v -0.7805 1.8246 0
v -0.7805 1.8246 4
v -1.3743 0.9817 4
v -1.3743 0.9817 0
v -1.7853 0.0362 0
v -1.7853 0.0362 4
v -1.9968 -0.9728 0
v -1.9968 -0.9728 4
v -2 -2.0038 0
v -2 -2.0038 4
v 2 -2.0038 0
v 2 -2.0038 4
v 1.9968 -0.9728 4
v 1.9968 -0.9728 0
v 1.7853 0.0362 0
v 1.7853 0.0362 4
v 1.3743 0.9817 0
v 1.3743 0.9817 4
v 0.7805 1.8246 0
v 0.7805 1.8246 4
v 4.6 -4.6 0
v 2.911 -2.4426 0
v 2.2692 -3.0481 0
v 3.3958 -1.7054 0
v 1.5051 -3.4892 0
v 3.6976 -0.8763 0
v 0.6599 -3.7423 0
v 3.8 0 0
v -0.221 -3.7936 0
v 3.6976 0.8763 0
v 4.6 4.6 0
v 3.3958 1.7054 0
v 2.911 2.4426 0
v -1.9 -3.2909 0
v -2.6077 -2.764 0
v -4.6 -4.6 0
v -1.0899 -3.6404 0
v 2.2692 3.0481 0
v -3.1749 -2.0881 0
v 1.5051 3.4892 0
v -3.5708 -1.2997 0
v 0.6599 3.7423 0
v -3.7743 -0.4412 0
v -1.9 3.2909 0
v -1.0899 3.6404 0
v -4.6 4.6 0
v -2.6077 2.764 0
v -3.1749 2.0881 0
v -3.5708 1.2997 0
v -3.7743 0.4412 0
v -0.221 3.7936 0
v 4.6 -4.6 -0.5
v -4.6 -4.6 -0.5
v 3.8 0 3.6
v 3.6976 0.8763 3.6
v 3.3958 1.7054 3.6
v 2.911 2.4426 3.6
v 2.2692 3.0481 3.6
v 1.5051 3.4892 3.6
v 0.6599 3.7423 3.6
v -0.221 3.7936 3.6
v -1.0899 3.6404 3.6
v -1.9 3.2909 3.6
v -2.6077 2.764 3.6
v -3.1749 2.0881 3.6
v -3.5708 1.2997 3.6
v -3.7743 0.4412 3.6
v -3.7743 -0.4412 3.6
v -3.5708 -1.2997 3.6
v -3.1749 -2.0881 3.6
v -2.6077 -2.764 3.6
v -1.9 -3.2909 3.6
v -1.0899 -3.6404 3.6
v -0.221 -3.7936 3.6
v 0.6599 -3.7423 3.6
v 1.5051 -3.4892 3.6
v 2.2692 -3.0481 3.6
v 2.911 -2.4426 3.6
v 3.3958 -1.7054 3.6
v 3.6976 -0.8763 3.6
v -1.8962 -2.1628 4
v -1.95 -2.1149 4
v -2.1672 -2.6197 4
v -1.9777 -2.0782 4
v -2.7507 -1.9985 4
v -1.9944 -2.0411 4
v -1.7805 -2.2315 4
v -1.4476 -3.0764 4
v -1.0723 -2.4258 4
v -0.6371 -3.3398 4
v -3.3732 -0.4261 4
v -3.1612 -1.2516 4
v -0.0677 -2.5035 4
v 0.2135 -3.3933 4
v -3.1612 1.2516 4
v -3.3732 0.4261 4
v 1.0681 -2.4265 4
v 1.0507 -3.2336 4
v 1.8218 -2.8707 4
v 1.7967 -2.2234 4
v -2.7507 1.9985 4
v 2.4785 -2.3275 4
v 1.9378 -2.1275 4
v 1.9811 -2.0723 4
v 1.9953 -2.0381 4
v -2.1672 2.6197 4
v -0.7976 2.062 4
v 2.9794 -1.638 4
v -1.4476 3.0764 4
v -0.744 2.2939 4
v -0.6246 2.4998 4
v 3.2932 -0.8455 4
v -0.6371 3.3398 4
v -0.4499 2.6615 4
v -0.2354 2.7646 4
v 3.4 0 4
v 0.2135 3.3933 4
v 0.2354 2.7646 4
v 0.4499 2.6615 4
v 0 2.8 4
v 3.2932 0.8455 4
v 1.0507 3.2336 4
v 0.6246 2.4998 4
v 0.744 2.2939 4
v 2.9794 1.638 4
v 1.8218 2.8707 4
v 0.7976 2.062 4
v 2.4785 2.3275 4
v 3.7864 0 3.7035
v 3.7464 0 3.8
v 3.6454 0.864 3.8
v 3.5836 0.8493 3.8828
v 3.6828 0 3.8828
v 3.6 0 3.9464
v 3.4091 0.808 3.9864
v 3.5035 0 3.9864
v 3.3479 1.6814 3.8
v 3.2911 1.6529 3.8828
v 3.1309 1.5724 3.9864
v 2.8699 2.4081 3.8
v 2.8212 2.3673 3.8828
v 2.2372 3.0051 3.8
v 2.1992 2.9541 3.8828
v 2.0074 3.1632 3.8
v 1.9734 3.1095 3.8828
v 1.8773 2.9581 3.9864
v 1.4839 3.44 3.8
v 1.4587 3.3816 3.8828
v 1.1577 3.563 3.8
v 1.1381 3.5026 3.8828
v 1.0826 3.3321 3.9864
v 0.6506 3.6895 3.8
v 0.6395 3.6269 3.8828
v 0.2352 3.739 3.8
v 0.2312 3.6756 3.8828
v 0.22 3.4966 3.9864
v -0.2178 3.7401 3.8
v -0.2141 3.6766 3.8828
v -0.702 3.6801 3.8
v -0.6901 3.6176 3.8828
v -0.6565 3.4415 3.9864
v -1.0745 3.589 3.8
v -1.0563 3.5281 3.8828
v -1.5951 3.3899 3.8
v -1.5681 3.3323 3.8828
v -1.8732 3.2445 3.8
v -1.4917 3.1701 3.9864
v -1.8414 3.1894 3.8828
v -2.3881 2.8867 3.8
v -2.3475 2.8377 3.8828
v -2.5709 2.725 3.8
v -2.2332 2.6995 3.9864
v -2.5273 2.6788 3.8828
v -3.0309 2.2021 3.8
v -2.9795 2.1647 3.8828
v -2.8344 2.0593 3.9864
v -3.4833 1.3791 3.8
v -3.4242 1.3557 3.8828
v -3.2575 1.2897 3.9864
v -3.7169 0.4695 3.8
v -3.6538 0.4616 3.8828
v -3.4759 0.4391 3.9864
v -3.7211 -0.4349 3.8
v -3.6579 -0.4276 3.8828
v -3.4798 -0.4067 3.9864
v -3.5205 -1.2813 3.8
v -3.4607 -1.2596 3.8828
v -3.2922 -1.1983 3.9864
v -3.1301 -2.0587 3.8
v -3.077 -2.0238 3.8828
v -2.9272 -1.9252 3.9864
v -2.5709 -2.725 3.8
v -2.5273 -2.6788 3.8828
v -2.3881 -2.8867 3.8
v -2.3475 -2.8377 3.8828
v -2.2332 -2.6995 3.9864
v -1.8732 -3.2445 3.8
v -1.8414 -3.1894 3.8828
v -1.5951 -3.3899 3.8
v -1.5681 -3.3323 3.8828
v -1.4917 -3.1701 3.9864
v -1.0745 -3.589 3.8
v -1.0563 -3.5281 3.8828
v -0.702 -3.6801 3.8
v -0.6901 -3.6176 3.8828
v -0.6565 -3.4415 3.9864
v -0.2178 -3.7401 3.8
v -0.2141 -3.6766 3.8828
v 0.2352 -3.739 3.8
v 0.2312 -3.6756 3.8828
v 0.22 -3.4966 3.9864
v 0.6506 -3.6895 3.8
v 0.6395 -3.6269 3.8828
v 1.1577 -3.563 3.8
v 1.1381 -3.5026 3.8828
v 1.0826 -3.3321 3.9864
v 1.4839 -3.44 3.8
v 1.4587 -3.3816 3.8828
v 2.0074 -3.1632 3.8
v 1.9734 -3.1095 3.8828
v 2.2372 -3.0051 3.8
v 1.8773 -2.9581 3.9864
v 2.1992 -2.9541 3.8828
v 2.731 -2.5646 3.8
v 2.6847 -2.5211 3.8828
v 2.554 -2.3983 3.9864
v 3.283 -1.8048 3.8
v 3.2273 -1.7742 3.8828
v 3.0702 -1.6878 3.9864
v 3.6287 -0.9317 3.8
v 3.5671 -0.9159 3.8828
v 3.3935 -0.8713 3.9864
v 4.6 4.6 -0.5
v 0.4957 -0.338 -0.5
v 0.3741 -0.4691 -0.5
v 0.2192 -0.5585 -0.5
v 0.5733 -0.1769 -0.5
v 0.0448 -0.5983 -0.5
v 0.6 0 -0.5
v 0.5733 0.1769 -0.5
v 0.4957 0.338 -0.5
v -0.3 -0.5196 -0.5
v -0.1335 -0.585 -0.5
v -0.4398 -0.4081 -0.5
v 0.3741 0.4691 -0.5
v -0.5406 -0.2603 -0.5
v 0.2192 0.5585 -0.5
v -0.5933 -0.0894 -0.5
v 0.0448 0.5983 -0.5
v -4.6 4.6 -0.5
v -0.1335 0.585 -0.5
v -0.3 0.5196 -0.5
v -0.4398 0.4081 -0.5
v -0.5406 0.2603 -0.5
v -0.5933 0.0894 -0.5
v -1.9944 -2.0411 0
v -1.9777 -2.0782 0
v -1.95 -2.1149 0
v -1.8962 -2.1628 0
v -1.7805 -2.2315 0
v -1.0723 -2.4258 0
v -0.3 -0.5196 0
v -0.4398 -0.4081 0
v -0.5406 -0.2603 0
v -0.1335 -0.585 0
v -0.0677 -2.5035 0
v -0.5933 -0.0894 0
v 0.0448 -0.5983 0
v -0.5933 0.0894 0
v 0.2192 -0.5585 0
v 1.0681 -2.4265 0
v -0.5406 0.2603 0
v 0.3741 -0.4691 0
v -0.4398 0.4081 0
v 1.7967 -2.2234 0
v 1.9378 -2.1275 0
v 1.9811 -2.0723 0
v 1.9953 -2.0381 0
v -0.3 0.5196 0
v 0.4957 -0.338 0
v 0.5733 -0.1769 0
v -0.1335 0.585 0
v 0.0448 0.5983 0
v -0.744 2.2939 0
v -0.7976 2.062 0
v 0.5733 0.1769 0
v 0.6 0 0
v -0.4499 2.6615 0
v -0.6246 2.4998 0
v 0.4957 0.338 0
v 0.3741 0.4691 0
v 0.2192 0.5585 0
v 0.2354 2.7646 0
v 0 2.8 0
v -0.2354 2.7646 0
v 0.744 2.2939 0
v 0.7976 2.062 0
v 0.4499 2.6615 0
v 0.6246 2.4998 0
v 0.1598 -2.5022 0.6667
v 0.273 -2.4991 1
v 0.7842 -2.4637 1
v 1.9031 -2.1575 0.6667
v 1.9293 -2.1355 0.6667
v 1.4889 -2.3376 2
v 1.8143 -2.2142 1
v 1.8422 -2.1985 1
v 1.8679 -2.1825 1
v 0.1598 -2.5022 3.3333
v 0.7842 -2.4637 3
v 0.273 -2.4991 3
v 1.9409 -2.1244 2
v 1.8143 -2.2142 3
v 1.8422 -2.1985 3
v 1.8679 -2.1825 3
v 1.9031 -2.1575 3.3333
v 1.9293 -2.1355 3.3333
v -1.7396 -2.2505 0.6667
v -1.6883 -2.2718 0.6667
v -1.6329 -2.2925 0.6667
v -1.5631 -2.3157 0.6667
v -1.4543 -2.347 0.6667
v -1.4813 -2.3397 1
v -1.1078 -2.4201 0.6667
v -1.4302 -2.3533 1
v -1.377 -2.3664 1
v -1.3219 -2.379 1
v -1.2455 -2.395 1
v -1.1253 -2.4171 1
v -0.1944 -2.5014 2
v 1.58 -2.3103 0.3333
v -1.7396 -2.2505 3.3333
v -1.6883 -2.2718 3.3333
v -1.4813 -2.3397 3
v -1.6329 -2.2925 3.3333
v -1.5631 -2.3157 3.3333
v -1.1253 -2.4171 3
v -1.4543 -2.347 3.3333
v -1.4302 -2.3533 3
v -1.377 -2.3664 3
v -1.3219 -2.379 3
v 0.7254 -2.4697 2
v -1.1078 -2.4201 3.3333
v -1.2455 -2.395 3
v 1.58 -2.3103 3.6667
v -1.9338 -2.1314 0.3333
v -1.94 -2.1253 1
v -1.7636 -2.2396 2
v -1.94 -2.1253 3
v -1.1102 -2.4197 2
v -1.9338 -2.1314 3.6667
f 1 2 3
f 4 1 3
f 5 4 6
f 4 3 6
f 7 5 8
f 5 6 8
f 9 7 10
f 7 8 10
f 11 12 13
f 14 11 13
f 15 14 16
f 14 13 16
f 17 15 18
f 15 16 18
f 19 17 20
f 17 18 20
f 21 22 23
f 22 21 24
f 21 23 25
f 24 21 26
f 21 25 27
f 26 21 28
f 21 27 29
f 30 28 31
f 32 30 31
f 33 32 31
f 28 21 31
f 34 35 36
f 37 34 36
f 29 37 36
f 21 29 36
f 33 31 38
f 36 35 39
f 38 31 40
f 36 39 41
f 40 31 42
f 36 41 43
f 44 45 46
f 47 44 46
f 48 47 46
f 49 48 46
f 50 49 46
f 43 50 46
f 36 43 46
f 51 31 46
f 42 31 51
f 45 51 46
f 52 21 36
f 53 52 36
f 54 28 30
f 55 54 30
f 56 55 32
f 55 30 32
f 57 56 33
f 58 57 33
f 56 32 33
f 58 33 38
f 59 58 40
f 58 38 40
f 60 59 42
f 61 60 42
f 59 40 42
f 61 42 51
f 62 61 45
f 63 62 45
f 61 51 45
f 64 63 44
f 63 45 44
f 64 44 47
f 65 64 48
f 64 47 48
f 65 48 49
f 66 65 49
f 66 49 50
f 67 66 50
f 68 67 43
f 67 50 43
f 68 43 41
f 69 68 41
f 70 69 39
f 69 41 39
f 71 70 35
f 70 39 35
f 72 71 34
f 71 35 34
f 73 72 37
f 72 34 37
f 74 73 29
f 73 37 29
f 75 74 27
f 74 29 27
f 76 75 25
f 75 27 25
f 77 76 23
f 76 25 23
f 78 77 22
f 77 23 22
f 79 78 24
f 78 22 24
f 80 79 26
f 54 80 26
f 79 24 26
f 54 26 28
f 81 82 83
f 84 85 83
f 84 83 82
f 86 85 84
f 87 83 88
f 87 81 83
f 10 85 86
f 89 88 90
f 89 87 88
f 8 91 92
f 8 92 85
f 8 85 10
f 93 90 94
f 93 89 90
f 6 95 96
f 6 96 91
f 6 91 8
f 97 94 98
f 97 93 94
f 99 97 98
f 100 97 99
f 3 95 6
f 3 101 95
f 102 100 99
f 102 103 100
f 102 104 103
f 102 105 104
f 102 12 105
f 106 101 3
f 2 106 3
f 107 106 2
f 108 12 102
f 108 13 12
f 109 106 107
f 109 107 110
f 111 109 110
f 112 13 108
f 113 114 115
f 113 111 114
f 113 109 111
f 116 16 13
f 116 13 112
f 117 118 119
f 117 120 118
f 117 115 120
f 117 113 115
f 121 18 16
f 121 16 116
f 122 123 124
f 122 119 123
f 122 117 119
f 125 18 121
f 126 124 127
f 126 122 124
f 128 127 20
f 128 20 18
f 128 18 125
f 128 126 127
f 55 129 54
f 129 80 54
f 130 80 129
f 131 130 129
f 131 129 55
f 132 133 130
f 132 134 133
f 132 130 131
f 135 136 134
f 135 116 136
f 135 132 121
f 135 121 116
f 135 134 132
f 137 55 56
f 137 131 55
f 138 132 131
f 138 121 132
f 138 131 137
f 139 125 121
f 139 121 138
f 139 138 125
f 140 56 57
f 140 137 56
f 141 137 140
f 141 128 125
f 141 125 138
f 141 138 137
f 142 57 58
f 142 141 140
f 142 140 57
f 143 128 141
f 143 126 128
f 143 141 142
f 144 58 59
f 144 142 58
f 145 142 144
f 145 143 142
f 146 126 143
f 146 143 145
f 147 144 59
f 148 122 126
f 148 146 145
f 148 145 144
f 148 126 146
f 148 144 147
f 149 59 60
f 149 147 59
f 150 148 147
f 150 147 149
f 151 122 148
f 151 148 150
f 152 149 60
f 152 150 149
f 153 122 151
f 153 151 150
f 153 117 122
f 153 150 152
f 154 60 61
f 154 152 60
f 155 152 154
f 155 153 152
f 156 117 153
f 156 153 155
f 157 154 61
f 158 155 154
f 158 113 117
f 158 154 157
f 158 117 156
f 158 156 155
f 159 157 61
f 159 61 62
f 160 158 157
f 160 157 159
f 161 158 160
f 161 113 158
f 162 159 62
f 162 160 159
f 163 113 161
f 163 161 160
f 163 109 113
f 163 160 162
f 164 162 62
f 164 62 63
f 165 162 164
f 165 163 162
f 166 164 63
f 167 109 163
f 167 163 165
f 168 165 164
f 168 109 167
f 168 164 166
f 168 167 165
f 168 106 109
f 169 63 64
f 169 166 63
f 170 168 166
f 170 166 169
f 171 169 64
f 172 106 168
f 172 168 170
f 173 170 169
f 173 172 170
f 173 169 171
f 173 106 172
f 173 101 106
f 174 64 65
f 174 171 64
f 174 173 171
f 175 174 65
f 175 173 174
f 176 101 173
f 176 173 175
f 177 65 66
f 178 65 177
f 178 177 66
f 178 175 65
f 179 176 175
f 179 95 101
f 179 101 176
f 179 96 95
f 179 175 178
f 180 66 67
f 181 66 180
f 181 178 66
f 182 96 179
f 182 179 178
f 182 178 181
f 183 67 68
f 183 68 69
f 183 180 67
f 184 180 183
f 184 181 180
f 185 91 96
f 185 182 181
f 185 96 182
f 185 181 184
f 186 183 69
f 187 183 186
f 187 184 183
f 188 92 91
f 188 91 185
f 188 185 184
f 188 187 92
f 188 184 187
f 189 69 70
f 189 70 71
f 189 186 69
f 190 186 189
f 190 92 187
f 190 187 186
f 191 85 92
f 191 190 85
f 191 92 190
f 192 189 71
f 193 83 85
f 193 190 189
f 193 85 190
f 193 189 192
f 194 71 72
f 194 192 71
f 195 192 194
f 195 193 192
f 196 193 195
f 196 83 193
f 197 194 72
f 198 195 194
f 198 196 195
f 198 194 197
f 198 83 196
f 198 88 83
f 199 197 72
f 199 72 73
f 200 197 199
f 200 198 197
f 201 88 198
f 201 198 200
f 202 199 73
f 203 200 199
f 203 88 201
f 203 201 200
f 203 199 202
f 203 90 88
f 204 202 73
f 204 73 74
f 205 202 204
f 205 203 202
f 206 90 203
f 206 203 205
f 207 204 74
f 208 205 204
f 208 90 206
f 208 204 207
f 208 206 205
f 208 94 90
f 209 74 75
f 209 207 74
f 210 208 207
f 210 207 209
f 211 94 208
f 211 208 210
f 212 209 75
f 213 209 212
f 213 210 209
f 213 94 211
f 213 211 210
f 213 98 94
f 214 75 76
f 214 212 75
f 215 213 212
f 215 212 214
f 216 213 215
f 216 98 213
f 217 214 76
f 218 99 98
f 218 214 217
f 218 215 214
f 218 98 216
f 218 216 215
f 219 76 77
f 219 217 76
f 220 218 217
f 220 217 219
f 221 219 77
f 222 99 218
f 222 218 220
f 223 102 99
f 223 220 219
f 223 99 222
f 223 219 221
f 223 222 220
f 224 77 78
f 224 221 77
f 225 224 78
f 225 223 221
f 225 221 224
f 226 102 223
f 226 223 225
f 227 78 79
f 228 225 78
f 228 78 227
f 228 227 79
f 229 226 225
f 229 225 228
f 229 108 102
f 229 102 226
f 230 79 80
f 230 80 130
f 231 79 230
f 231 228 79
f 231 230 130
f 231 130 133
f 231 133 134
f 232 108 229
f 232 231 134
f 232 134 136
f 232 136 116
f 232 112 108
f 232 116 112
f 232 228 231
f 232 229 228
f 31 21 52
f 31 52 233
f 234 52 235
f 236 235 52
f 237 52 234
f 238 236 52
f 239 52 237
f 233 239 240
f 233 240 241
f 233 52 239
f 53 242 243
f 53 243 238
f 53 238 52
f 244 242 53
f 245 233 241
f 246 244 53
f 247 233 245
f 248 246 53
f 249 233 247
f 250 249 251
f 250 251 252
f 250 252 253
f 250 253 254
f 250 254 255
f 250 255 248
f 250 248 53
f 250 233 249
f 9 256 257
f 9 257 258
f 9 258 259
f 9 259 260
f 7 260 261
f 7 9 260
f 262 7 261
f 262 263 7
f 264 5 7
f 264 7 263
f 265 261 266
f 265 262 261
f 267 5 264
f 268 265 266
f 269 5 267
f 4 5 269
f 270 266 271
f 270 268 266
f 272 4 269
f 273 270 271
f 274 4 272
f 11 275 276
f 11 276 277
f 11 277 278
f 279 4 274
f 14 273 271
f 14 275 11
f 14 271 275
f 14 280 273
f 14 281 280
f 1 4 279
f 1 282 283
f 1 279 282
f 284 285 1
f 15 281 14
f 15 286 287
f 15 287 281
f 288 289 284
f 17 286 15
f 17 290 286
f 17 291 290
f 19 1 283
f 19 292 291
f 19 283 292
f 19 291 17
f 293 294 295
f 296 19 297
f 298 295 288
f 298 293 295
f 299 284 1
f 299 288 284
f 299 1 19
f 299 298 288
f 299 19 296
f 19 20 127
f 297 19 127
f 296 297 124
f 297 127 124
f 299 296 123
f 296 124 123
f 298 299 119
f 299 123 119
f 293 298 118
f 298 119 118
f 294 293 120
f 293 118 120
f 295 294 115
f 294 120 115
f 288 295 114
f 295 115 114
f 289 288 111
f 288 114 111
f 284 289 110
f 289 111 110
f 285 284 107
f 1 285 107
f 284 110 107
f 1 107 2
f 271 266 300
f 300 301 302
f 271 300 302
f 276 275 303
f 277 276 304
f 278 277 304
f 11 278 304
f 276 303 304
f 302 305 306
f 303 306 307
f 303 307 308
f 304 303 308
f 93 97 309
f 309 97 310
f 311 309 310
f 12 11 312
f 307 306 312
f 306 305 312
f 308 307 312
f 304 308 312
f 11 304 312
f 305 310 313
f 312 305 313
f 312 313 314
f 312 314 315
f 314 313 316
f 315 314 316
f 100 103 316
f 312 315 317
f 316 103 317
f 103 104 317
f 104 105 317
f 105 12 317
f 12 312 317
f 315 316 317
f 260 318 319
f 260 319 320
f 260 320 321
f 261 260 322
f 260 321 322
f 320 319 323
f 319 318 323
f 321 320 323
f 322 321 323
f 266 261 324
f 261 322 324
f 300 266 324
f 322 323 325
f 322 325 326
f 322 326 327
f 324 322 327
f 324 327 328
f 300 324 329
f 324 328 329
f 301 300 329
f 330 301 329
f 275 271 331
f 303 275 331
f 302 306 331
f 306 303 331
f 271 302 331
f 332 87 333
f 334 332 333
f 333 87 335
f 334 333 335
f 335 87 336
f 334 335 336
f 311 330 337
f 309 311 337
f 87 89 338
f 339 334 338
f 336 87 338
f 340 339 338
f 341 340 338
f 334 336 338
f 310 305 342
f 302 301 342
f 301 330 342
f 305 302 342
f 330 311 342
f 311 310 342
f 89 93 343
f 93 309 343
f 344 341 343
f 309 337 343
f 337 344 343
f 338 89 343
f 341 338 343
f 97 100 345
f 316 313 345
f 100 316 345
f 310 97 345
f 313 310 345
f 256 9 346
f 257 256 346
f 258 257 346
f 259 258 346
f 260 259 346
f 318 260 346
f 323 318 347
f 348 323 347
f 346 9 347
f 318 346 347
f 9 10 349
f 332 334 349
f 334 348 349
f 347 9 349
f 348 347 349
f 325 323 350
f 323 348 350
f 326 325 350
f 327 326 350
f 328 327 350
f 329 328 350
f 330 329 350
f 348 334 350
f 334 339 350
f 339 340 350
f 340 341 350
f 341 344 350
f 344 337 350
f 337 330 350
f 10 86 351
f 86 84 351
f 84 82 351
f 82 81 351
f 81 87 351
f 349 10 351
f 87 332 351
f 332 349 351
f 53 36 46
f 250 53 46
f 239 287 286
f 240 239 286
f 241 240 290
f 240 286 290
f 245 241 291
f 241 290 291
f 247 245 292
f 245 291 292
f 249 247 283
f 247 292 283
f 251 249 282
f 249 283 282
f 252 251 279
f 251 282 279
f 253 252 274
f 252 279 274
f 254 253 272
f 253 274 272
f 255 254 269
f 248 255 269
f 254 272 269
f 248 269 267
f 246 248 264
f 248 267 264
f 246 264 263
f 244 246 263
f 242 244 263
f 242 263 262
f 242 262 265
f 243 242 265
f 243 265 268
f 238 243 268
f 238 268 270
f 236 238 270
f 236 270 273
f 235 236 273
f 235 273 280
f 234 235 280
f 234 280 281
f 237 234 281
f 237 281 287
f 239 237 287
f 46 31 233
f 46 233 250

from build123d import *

# Parameters (mm, degrees)
SKETCH_1_R          = 3.8
EXTRUDE_1_DEPTH     = 4
SKETCH_2_W          = 9.2
SKETCH_2_H          = 9.2
EXTRUDE_2_DEPTH     = 0.5
FILLET_1_R          = 0.4
SKETCH_7_RX         = 2
SKETCH_7_RY         = 0.5
SKETCH_7_R          = 0.8
CUT_EXTRUDE_4_DEPTH = 4
SKETCH_8_R          = 0.6
CUT_EXTRUDE_5_DEPTH = 8.636753237


with BuildPart() as part:
    # Эскиз1 → Бобышка-Вытянуть1 (new body)
    with BuildSketch(Plane.XY):
        Circle(SKETCH_1_R)
    extrude(amount=EXTRUDE_1_DEPTH)

    # Эскиз2 → Бобышка-Вытянуть2 (add)
    with BuildSketch(Plane(origin=(0, 0, 0), x_dir=(-1, 0, 0), z_dir=(0, 0, -1))):
        Rectangle(SKETCH_2_W, SKETCH_2_H)
    extrude(amount=EXTRUDE_2_DEPTH)

    # Скругление1
    fillet_1_edges = [part.edges().sort_by_distance(p)[0] for p in [
        (-3.8, 0, 4),
    ]]
    fillet(fillet_1_edges, radius=FILLET_1_R)

    # Эскиз7 → Вырез-Вытянуть4 (cut)
    with BuildSketch(Plane.XY.offset(4)):
        with BuildLine():
            ThreePointArc((0.780530418, 1.824579743), (0, 1.2), (-0.780530418, 1.824579743))
            ThreePointArc((-0.780530418, 1.824579743), (-1.785343213, 0.036245206), (-2, -2.003782154))
            add(Edge.make_bspline(
                [(2, -2.003782154), (2, -1.503782154), (0, -1.503782154), (-2, -1.503782154), (-2, -2.003782154)],
                knots=[0, 0, 0, 1.570796327, 1.570796327, 3.141592654, 3.141592654, 3.141592654], degree=2, weights=[1, 0.707106781, 1, 0.707106781, 1]))
            ThreePointArc((2, -2.003782154), (1.785343213, 0.036245206), (0.780530418, 1.824579743))
        make_face()
        with Locations((0, -2.003782154)):
            Ellipse(SKETCH_7_RX, SKETCH_7_RY)
        with Locations((0, 2)):
            Circle(SKETCH_7_R)
    extrude(amount=-CUT_EXTRUDE_4_DEPTH, mode=Mode.SUBTRACT)

    # Эскиз8 → Вырез-Вытянуть5 (cut, through all)
    with BuildSketch(Plane.XY):
        Circle(SKETCH_8_R)
    extrude(amount=-CUT_EXTRUDE_5_DEPTH, mode=Mode.SUBTRACT)


solid = part.part
